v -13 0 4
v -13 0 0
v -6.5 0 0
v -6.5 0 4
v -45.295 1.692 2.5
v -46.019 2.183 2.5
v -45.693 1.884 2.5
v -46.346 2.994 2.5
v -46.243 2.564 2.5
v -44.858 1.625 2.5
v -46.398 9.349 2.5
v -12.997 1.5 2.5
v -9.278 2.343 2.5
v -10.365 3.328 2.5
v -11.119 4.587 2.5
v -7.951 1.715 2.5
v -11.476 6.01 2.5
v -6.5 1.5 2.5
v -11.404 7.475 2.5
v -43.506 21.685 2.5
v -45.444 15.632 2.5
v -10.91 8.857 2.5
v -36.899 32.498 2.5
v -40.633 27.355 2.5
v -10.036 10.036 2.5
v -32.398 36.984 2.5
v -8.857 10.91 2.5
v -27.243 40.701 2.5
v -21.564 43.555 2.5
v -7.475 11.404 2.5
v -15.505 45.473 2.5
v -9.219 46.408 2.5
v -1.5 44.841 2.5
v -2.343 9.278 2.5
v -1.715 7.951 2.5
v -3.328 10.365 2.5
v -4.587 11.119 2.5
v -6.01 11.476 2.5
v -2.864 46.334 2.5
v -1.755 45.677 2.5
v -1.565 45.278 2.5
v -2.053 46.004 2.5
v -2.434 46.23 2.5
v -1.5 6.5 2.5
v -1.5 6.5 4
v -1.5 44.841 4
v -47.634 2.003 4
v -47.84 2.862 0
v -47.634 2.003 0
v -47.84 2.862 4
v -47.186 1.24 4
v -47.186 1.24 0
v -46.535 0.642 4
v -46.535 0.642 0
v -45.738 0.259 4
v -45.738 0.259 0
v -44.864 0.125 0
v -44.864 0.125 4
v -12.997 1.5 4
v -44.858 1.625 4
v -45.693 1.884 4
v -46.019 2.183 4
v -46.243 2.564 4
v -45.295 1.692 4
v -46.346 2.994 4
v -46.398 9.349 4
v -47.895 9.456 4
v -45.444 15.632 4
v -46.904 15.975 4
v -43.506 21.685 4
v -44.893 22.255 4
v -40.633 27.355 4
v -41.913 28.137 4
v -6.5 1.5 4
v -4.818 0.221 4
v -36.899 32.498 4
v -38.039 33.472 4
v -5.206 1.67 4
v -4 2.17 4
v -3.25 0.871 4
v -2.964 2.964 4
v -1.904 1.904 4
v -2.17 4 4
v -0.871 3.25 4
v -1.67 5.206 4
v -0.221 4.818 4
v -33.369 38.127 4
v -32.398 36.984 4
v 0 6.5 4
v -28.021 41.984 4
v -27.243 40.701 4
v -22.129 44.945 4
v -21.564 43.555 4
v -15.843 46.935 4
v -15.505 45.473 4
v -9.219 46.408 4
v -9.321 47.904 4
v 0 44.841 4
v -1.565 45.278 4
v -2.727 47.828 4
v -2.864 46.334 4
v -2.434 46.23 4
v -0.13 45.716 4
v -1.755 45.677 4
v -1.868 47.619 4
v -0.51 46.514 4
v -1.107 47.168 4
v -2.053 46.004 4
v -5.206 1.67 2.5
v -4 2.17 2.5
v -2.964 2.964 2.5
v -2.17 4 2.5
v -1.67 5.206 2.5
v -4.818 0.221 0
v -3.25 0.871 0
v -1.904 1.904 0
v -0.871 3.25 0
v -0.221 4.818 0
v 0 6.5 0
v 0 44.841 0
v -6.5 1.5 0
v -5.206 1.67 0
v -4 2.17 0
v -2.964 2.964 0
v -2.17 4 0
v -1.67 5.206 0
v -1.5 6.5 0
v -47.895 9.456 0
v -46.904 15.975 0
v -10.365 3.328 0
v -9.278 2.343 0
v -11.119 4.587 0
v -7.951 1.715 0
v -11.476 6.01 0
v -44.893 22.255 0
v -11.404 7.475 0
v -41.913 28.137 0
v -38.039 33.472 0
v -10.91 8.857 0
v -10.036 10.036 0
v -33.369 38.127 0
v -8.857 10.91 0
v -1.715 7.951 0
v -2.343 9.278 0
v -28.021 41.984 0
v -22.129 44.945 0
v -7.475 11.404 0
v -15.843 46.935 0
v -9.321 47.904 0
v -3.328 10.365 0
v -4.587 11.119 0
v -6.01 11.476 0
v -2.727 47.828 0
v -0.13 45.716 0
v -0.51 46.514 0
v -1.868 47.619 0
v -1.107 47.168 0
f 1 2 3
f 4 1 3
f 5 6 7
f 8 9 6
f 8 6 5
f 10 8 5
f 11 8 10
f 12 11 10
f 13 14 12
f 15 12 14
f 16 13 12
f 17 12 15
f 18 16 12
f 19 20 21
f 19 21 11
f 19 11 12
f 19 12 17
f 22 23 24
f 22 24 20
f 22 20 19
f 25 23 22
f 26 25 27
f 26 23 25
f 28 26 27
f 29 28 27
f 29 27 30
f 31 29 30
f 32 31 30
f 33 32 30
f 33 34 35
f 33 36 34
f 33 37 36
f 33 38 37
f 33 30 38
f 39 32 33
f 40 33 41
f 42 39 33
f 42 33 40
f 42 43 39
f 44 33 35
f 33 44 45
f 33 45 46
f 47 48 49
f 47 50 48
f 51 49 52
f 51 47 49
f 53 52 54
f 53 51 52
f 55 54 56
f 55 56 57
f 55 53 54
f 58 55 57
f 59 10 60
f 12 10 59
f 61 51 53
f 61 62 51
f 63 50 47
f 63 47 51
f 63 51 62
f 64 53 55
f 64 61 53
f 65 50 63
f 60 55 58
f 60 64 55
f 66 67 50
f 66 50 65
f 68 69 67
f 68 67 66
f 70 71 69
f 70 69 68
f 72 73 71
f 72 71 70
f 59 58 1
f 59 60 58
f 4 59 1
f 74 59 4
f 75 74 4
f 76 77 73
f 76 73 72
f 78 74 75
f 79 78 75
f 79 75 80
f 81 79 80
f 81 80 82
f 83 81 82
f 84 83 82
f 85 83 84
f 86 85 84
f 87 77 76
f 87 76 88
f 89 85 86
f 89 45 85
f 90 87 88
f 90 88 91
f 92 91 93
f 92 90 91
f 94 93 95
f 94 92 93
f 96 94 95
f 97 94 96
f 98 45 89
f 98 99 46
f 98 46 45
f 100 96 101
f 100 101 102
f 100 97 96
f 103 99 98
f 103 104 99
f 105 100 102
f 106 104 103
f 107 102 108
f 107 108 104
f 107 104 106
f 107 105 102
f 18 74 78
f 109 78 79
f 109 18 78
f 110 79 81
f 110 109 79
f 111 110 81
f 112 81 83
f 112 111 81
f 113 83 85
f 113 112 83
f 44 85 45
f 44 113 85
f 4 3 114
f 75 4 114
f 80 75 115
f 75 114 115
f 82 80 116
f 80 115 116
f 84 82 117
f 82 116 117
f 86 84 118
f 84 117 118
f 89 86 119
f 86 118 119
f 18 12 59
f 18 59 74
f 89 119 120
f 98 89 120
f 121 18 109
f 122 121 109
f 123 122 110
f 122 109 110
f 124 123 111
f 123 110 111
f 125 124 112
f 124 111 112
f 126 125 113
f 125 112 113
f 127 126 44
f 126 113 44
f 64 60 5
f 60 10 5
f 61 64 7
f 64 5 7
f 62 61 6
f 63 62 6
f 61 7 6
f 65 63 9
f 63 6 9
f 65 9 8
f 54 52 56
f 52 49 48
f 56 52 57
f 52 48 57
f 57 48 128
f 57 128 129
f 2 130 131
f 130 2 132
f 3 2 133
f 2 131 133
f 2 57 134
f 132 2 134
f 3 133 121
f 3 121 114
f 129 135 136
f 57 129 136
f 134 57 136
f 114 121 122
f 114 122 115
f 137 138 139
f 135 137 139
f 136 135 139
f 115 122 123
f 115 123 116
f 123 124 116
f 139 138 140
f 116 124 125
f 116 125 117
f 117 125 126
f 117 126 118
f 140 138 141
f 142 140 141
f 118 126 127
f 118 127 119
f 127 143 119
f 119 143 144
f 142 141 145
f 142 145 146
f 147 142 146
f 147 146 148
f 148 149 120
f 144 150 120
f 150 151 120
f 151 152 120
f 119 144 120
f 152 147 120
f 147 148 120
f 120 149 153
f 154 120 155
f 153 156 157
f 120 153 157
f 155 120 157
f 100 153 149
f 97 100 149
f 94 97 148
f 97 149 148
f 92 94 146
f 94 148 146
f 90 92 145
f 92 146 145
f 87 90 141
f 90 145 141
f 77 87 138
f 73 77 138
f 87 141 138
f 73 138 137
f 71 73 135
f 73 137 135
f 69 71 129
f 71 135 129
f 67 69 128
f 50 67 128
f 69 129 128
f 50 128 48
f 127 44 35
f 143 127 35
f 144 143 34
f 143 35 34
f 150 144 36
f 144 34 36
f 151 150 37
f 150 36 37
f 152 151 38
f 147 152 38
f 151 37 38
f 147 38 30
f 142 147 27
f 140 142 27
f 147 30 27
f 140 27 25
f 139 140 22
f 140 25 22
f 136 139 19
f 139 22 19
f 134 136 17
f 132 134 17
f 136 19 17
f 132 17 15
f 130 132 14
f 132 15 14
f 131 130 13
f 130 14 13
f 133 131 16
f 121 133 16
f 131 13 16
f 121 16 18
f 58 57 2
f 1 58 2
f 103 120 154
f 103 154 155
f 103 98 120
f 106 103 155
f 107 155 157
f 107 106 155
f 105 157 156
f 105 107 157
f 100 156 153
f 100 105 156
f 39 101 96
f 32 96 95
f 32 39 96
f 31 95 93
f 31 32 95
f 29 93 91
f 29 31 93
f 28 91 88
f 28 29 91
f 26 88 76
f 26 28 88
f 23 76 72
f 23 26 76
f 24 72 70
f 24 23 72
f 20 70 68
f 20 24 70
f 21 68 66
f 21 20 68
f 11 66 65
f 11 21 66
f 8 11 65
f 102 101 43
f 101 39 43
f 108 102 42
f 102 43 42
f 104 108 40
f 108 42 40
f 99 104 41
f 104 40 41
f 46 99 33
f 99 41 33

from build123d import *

# Parameters (mm, degrees)
F1_DEPTH = 4
F2_T     = -1.5
F5_DEPTH = 2.5
F7_DEPTH = 4.001
F8_R     = 3
F9_R     = 1.5


# Not quite as in the source:
# - a feature names something its author has since deleted; it is built from what else it names


with BuildPart() as f1:
    # F0 (on Top) → F1 (new body)
    with BuildSketch(Plane.XY):
        with BuildLine():
            ThreePointArc((-6.5, 0), (-1.9038059223, 1.9038059223), (0, 6.5))
            Line((0, 6.5), (0, 47.4878030638))
            ThreePointArc((0, 47.4878030638), (-35.79631442, 35.8934680057), (-47.5090982427, 0.1357356025))
            Line((-47.5090982427, 0.1357356025), (-13, 0))
            Line((-13, 0), (-6.5, 0))
        make_face()
    extrude(amount=F1_DEPTH)

    # F2
    f2_openings = [f1.faces().sort_by_distance(p)[0] for p in [
        (-21.256566, 21.300379, 4),
        (-21.256566, 21.300379, 0),
    ]]
    offset(amount=F2_T, openings=f2_openings)

    # F4 (on offset) → F5 (join)
    with BuildSketch(Plane.XY.offset(2.5)):
        with BuildLine():
            Line((-46.2025064836, 1.6306079518), (-12.9970500154, 1.5))
            Line((-12.9970500154, 1.5), (-6.5, 1.5))
            ThreePointArc((-6.5, 1.5), (-2.9644660941, 2.9644660941), (-1.5, 6.5))
            Line((-1.5, 6.5), (-1.5, 46.186269666))
            ThreePointArc((-1.5, 46.186269666), (-34.737700628, 34.8307653134), (-46.2025064836, 1.6306079518))
        make_face()
    extrude(amount=-F5_DEPTH)

    # F6 (on face) → F7 (cut, through all)
    with BuildSketch(Plane.XY.offset(4)):
        with BuildLine():
            ThreePointArc((-1.5, 6.5), (-10.0355339059, 10.0355339059), (-6.5, 1.5))
            ThreePointArc((-6.5, 1.5), (-2.9644660941, 2.9644660941), (-1.5, 6.5))
        make_face()
    extrude(amount=-F7_DEPTH, mode=Mode.SUBTRACT)

    # F8
    f8_edges = [f1.edges().sort_by_distance(p)[0] for p in [
        (-47.509098, 0.135736, 2),
        (0, 47.487803, 2),
    ]]
    fillet(f8_edges, radius=F8_R)

    # F9
    f9_edges = [f1.edges().sort_by_distance(p)[0] for p in [
        (-46.202506, 1.630608, 3.25),
        (-1.5, 46.18627, 3.25),
    ]]
    fillet(f9_edges, radius=F9_R)


solid = f1.part
